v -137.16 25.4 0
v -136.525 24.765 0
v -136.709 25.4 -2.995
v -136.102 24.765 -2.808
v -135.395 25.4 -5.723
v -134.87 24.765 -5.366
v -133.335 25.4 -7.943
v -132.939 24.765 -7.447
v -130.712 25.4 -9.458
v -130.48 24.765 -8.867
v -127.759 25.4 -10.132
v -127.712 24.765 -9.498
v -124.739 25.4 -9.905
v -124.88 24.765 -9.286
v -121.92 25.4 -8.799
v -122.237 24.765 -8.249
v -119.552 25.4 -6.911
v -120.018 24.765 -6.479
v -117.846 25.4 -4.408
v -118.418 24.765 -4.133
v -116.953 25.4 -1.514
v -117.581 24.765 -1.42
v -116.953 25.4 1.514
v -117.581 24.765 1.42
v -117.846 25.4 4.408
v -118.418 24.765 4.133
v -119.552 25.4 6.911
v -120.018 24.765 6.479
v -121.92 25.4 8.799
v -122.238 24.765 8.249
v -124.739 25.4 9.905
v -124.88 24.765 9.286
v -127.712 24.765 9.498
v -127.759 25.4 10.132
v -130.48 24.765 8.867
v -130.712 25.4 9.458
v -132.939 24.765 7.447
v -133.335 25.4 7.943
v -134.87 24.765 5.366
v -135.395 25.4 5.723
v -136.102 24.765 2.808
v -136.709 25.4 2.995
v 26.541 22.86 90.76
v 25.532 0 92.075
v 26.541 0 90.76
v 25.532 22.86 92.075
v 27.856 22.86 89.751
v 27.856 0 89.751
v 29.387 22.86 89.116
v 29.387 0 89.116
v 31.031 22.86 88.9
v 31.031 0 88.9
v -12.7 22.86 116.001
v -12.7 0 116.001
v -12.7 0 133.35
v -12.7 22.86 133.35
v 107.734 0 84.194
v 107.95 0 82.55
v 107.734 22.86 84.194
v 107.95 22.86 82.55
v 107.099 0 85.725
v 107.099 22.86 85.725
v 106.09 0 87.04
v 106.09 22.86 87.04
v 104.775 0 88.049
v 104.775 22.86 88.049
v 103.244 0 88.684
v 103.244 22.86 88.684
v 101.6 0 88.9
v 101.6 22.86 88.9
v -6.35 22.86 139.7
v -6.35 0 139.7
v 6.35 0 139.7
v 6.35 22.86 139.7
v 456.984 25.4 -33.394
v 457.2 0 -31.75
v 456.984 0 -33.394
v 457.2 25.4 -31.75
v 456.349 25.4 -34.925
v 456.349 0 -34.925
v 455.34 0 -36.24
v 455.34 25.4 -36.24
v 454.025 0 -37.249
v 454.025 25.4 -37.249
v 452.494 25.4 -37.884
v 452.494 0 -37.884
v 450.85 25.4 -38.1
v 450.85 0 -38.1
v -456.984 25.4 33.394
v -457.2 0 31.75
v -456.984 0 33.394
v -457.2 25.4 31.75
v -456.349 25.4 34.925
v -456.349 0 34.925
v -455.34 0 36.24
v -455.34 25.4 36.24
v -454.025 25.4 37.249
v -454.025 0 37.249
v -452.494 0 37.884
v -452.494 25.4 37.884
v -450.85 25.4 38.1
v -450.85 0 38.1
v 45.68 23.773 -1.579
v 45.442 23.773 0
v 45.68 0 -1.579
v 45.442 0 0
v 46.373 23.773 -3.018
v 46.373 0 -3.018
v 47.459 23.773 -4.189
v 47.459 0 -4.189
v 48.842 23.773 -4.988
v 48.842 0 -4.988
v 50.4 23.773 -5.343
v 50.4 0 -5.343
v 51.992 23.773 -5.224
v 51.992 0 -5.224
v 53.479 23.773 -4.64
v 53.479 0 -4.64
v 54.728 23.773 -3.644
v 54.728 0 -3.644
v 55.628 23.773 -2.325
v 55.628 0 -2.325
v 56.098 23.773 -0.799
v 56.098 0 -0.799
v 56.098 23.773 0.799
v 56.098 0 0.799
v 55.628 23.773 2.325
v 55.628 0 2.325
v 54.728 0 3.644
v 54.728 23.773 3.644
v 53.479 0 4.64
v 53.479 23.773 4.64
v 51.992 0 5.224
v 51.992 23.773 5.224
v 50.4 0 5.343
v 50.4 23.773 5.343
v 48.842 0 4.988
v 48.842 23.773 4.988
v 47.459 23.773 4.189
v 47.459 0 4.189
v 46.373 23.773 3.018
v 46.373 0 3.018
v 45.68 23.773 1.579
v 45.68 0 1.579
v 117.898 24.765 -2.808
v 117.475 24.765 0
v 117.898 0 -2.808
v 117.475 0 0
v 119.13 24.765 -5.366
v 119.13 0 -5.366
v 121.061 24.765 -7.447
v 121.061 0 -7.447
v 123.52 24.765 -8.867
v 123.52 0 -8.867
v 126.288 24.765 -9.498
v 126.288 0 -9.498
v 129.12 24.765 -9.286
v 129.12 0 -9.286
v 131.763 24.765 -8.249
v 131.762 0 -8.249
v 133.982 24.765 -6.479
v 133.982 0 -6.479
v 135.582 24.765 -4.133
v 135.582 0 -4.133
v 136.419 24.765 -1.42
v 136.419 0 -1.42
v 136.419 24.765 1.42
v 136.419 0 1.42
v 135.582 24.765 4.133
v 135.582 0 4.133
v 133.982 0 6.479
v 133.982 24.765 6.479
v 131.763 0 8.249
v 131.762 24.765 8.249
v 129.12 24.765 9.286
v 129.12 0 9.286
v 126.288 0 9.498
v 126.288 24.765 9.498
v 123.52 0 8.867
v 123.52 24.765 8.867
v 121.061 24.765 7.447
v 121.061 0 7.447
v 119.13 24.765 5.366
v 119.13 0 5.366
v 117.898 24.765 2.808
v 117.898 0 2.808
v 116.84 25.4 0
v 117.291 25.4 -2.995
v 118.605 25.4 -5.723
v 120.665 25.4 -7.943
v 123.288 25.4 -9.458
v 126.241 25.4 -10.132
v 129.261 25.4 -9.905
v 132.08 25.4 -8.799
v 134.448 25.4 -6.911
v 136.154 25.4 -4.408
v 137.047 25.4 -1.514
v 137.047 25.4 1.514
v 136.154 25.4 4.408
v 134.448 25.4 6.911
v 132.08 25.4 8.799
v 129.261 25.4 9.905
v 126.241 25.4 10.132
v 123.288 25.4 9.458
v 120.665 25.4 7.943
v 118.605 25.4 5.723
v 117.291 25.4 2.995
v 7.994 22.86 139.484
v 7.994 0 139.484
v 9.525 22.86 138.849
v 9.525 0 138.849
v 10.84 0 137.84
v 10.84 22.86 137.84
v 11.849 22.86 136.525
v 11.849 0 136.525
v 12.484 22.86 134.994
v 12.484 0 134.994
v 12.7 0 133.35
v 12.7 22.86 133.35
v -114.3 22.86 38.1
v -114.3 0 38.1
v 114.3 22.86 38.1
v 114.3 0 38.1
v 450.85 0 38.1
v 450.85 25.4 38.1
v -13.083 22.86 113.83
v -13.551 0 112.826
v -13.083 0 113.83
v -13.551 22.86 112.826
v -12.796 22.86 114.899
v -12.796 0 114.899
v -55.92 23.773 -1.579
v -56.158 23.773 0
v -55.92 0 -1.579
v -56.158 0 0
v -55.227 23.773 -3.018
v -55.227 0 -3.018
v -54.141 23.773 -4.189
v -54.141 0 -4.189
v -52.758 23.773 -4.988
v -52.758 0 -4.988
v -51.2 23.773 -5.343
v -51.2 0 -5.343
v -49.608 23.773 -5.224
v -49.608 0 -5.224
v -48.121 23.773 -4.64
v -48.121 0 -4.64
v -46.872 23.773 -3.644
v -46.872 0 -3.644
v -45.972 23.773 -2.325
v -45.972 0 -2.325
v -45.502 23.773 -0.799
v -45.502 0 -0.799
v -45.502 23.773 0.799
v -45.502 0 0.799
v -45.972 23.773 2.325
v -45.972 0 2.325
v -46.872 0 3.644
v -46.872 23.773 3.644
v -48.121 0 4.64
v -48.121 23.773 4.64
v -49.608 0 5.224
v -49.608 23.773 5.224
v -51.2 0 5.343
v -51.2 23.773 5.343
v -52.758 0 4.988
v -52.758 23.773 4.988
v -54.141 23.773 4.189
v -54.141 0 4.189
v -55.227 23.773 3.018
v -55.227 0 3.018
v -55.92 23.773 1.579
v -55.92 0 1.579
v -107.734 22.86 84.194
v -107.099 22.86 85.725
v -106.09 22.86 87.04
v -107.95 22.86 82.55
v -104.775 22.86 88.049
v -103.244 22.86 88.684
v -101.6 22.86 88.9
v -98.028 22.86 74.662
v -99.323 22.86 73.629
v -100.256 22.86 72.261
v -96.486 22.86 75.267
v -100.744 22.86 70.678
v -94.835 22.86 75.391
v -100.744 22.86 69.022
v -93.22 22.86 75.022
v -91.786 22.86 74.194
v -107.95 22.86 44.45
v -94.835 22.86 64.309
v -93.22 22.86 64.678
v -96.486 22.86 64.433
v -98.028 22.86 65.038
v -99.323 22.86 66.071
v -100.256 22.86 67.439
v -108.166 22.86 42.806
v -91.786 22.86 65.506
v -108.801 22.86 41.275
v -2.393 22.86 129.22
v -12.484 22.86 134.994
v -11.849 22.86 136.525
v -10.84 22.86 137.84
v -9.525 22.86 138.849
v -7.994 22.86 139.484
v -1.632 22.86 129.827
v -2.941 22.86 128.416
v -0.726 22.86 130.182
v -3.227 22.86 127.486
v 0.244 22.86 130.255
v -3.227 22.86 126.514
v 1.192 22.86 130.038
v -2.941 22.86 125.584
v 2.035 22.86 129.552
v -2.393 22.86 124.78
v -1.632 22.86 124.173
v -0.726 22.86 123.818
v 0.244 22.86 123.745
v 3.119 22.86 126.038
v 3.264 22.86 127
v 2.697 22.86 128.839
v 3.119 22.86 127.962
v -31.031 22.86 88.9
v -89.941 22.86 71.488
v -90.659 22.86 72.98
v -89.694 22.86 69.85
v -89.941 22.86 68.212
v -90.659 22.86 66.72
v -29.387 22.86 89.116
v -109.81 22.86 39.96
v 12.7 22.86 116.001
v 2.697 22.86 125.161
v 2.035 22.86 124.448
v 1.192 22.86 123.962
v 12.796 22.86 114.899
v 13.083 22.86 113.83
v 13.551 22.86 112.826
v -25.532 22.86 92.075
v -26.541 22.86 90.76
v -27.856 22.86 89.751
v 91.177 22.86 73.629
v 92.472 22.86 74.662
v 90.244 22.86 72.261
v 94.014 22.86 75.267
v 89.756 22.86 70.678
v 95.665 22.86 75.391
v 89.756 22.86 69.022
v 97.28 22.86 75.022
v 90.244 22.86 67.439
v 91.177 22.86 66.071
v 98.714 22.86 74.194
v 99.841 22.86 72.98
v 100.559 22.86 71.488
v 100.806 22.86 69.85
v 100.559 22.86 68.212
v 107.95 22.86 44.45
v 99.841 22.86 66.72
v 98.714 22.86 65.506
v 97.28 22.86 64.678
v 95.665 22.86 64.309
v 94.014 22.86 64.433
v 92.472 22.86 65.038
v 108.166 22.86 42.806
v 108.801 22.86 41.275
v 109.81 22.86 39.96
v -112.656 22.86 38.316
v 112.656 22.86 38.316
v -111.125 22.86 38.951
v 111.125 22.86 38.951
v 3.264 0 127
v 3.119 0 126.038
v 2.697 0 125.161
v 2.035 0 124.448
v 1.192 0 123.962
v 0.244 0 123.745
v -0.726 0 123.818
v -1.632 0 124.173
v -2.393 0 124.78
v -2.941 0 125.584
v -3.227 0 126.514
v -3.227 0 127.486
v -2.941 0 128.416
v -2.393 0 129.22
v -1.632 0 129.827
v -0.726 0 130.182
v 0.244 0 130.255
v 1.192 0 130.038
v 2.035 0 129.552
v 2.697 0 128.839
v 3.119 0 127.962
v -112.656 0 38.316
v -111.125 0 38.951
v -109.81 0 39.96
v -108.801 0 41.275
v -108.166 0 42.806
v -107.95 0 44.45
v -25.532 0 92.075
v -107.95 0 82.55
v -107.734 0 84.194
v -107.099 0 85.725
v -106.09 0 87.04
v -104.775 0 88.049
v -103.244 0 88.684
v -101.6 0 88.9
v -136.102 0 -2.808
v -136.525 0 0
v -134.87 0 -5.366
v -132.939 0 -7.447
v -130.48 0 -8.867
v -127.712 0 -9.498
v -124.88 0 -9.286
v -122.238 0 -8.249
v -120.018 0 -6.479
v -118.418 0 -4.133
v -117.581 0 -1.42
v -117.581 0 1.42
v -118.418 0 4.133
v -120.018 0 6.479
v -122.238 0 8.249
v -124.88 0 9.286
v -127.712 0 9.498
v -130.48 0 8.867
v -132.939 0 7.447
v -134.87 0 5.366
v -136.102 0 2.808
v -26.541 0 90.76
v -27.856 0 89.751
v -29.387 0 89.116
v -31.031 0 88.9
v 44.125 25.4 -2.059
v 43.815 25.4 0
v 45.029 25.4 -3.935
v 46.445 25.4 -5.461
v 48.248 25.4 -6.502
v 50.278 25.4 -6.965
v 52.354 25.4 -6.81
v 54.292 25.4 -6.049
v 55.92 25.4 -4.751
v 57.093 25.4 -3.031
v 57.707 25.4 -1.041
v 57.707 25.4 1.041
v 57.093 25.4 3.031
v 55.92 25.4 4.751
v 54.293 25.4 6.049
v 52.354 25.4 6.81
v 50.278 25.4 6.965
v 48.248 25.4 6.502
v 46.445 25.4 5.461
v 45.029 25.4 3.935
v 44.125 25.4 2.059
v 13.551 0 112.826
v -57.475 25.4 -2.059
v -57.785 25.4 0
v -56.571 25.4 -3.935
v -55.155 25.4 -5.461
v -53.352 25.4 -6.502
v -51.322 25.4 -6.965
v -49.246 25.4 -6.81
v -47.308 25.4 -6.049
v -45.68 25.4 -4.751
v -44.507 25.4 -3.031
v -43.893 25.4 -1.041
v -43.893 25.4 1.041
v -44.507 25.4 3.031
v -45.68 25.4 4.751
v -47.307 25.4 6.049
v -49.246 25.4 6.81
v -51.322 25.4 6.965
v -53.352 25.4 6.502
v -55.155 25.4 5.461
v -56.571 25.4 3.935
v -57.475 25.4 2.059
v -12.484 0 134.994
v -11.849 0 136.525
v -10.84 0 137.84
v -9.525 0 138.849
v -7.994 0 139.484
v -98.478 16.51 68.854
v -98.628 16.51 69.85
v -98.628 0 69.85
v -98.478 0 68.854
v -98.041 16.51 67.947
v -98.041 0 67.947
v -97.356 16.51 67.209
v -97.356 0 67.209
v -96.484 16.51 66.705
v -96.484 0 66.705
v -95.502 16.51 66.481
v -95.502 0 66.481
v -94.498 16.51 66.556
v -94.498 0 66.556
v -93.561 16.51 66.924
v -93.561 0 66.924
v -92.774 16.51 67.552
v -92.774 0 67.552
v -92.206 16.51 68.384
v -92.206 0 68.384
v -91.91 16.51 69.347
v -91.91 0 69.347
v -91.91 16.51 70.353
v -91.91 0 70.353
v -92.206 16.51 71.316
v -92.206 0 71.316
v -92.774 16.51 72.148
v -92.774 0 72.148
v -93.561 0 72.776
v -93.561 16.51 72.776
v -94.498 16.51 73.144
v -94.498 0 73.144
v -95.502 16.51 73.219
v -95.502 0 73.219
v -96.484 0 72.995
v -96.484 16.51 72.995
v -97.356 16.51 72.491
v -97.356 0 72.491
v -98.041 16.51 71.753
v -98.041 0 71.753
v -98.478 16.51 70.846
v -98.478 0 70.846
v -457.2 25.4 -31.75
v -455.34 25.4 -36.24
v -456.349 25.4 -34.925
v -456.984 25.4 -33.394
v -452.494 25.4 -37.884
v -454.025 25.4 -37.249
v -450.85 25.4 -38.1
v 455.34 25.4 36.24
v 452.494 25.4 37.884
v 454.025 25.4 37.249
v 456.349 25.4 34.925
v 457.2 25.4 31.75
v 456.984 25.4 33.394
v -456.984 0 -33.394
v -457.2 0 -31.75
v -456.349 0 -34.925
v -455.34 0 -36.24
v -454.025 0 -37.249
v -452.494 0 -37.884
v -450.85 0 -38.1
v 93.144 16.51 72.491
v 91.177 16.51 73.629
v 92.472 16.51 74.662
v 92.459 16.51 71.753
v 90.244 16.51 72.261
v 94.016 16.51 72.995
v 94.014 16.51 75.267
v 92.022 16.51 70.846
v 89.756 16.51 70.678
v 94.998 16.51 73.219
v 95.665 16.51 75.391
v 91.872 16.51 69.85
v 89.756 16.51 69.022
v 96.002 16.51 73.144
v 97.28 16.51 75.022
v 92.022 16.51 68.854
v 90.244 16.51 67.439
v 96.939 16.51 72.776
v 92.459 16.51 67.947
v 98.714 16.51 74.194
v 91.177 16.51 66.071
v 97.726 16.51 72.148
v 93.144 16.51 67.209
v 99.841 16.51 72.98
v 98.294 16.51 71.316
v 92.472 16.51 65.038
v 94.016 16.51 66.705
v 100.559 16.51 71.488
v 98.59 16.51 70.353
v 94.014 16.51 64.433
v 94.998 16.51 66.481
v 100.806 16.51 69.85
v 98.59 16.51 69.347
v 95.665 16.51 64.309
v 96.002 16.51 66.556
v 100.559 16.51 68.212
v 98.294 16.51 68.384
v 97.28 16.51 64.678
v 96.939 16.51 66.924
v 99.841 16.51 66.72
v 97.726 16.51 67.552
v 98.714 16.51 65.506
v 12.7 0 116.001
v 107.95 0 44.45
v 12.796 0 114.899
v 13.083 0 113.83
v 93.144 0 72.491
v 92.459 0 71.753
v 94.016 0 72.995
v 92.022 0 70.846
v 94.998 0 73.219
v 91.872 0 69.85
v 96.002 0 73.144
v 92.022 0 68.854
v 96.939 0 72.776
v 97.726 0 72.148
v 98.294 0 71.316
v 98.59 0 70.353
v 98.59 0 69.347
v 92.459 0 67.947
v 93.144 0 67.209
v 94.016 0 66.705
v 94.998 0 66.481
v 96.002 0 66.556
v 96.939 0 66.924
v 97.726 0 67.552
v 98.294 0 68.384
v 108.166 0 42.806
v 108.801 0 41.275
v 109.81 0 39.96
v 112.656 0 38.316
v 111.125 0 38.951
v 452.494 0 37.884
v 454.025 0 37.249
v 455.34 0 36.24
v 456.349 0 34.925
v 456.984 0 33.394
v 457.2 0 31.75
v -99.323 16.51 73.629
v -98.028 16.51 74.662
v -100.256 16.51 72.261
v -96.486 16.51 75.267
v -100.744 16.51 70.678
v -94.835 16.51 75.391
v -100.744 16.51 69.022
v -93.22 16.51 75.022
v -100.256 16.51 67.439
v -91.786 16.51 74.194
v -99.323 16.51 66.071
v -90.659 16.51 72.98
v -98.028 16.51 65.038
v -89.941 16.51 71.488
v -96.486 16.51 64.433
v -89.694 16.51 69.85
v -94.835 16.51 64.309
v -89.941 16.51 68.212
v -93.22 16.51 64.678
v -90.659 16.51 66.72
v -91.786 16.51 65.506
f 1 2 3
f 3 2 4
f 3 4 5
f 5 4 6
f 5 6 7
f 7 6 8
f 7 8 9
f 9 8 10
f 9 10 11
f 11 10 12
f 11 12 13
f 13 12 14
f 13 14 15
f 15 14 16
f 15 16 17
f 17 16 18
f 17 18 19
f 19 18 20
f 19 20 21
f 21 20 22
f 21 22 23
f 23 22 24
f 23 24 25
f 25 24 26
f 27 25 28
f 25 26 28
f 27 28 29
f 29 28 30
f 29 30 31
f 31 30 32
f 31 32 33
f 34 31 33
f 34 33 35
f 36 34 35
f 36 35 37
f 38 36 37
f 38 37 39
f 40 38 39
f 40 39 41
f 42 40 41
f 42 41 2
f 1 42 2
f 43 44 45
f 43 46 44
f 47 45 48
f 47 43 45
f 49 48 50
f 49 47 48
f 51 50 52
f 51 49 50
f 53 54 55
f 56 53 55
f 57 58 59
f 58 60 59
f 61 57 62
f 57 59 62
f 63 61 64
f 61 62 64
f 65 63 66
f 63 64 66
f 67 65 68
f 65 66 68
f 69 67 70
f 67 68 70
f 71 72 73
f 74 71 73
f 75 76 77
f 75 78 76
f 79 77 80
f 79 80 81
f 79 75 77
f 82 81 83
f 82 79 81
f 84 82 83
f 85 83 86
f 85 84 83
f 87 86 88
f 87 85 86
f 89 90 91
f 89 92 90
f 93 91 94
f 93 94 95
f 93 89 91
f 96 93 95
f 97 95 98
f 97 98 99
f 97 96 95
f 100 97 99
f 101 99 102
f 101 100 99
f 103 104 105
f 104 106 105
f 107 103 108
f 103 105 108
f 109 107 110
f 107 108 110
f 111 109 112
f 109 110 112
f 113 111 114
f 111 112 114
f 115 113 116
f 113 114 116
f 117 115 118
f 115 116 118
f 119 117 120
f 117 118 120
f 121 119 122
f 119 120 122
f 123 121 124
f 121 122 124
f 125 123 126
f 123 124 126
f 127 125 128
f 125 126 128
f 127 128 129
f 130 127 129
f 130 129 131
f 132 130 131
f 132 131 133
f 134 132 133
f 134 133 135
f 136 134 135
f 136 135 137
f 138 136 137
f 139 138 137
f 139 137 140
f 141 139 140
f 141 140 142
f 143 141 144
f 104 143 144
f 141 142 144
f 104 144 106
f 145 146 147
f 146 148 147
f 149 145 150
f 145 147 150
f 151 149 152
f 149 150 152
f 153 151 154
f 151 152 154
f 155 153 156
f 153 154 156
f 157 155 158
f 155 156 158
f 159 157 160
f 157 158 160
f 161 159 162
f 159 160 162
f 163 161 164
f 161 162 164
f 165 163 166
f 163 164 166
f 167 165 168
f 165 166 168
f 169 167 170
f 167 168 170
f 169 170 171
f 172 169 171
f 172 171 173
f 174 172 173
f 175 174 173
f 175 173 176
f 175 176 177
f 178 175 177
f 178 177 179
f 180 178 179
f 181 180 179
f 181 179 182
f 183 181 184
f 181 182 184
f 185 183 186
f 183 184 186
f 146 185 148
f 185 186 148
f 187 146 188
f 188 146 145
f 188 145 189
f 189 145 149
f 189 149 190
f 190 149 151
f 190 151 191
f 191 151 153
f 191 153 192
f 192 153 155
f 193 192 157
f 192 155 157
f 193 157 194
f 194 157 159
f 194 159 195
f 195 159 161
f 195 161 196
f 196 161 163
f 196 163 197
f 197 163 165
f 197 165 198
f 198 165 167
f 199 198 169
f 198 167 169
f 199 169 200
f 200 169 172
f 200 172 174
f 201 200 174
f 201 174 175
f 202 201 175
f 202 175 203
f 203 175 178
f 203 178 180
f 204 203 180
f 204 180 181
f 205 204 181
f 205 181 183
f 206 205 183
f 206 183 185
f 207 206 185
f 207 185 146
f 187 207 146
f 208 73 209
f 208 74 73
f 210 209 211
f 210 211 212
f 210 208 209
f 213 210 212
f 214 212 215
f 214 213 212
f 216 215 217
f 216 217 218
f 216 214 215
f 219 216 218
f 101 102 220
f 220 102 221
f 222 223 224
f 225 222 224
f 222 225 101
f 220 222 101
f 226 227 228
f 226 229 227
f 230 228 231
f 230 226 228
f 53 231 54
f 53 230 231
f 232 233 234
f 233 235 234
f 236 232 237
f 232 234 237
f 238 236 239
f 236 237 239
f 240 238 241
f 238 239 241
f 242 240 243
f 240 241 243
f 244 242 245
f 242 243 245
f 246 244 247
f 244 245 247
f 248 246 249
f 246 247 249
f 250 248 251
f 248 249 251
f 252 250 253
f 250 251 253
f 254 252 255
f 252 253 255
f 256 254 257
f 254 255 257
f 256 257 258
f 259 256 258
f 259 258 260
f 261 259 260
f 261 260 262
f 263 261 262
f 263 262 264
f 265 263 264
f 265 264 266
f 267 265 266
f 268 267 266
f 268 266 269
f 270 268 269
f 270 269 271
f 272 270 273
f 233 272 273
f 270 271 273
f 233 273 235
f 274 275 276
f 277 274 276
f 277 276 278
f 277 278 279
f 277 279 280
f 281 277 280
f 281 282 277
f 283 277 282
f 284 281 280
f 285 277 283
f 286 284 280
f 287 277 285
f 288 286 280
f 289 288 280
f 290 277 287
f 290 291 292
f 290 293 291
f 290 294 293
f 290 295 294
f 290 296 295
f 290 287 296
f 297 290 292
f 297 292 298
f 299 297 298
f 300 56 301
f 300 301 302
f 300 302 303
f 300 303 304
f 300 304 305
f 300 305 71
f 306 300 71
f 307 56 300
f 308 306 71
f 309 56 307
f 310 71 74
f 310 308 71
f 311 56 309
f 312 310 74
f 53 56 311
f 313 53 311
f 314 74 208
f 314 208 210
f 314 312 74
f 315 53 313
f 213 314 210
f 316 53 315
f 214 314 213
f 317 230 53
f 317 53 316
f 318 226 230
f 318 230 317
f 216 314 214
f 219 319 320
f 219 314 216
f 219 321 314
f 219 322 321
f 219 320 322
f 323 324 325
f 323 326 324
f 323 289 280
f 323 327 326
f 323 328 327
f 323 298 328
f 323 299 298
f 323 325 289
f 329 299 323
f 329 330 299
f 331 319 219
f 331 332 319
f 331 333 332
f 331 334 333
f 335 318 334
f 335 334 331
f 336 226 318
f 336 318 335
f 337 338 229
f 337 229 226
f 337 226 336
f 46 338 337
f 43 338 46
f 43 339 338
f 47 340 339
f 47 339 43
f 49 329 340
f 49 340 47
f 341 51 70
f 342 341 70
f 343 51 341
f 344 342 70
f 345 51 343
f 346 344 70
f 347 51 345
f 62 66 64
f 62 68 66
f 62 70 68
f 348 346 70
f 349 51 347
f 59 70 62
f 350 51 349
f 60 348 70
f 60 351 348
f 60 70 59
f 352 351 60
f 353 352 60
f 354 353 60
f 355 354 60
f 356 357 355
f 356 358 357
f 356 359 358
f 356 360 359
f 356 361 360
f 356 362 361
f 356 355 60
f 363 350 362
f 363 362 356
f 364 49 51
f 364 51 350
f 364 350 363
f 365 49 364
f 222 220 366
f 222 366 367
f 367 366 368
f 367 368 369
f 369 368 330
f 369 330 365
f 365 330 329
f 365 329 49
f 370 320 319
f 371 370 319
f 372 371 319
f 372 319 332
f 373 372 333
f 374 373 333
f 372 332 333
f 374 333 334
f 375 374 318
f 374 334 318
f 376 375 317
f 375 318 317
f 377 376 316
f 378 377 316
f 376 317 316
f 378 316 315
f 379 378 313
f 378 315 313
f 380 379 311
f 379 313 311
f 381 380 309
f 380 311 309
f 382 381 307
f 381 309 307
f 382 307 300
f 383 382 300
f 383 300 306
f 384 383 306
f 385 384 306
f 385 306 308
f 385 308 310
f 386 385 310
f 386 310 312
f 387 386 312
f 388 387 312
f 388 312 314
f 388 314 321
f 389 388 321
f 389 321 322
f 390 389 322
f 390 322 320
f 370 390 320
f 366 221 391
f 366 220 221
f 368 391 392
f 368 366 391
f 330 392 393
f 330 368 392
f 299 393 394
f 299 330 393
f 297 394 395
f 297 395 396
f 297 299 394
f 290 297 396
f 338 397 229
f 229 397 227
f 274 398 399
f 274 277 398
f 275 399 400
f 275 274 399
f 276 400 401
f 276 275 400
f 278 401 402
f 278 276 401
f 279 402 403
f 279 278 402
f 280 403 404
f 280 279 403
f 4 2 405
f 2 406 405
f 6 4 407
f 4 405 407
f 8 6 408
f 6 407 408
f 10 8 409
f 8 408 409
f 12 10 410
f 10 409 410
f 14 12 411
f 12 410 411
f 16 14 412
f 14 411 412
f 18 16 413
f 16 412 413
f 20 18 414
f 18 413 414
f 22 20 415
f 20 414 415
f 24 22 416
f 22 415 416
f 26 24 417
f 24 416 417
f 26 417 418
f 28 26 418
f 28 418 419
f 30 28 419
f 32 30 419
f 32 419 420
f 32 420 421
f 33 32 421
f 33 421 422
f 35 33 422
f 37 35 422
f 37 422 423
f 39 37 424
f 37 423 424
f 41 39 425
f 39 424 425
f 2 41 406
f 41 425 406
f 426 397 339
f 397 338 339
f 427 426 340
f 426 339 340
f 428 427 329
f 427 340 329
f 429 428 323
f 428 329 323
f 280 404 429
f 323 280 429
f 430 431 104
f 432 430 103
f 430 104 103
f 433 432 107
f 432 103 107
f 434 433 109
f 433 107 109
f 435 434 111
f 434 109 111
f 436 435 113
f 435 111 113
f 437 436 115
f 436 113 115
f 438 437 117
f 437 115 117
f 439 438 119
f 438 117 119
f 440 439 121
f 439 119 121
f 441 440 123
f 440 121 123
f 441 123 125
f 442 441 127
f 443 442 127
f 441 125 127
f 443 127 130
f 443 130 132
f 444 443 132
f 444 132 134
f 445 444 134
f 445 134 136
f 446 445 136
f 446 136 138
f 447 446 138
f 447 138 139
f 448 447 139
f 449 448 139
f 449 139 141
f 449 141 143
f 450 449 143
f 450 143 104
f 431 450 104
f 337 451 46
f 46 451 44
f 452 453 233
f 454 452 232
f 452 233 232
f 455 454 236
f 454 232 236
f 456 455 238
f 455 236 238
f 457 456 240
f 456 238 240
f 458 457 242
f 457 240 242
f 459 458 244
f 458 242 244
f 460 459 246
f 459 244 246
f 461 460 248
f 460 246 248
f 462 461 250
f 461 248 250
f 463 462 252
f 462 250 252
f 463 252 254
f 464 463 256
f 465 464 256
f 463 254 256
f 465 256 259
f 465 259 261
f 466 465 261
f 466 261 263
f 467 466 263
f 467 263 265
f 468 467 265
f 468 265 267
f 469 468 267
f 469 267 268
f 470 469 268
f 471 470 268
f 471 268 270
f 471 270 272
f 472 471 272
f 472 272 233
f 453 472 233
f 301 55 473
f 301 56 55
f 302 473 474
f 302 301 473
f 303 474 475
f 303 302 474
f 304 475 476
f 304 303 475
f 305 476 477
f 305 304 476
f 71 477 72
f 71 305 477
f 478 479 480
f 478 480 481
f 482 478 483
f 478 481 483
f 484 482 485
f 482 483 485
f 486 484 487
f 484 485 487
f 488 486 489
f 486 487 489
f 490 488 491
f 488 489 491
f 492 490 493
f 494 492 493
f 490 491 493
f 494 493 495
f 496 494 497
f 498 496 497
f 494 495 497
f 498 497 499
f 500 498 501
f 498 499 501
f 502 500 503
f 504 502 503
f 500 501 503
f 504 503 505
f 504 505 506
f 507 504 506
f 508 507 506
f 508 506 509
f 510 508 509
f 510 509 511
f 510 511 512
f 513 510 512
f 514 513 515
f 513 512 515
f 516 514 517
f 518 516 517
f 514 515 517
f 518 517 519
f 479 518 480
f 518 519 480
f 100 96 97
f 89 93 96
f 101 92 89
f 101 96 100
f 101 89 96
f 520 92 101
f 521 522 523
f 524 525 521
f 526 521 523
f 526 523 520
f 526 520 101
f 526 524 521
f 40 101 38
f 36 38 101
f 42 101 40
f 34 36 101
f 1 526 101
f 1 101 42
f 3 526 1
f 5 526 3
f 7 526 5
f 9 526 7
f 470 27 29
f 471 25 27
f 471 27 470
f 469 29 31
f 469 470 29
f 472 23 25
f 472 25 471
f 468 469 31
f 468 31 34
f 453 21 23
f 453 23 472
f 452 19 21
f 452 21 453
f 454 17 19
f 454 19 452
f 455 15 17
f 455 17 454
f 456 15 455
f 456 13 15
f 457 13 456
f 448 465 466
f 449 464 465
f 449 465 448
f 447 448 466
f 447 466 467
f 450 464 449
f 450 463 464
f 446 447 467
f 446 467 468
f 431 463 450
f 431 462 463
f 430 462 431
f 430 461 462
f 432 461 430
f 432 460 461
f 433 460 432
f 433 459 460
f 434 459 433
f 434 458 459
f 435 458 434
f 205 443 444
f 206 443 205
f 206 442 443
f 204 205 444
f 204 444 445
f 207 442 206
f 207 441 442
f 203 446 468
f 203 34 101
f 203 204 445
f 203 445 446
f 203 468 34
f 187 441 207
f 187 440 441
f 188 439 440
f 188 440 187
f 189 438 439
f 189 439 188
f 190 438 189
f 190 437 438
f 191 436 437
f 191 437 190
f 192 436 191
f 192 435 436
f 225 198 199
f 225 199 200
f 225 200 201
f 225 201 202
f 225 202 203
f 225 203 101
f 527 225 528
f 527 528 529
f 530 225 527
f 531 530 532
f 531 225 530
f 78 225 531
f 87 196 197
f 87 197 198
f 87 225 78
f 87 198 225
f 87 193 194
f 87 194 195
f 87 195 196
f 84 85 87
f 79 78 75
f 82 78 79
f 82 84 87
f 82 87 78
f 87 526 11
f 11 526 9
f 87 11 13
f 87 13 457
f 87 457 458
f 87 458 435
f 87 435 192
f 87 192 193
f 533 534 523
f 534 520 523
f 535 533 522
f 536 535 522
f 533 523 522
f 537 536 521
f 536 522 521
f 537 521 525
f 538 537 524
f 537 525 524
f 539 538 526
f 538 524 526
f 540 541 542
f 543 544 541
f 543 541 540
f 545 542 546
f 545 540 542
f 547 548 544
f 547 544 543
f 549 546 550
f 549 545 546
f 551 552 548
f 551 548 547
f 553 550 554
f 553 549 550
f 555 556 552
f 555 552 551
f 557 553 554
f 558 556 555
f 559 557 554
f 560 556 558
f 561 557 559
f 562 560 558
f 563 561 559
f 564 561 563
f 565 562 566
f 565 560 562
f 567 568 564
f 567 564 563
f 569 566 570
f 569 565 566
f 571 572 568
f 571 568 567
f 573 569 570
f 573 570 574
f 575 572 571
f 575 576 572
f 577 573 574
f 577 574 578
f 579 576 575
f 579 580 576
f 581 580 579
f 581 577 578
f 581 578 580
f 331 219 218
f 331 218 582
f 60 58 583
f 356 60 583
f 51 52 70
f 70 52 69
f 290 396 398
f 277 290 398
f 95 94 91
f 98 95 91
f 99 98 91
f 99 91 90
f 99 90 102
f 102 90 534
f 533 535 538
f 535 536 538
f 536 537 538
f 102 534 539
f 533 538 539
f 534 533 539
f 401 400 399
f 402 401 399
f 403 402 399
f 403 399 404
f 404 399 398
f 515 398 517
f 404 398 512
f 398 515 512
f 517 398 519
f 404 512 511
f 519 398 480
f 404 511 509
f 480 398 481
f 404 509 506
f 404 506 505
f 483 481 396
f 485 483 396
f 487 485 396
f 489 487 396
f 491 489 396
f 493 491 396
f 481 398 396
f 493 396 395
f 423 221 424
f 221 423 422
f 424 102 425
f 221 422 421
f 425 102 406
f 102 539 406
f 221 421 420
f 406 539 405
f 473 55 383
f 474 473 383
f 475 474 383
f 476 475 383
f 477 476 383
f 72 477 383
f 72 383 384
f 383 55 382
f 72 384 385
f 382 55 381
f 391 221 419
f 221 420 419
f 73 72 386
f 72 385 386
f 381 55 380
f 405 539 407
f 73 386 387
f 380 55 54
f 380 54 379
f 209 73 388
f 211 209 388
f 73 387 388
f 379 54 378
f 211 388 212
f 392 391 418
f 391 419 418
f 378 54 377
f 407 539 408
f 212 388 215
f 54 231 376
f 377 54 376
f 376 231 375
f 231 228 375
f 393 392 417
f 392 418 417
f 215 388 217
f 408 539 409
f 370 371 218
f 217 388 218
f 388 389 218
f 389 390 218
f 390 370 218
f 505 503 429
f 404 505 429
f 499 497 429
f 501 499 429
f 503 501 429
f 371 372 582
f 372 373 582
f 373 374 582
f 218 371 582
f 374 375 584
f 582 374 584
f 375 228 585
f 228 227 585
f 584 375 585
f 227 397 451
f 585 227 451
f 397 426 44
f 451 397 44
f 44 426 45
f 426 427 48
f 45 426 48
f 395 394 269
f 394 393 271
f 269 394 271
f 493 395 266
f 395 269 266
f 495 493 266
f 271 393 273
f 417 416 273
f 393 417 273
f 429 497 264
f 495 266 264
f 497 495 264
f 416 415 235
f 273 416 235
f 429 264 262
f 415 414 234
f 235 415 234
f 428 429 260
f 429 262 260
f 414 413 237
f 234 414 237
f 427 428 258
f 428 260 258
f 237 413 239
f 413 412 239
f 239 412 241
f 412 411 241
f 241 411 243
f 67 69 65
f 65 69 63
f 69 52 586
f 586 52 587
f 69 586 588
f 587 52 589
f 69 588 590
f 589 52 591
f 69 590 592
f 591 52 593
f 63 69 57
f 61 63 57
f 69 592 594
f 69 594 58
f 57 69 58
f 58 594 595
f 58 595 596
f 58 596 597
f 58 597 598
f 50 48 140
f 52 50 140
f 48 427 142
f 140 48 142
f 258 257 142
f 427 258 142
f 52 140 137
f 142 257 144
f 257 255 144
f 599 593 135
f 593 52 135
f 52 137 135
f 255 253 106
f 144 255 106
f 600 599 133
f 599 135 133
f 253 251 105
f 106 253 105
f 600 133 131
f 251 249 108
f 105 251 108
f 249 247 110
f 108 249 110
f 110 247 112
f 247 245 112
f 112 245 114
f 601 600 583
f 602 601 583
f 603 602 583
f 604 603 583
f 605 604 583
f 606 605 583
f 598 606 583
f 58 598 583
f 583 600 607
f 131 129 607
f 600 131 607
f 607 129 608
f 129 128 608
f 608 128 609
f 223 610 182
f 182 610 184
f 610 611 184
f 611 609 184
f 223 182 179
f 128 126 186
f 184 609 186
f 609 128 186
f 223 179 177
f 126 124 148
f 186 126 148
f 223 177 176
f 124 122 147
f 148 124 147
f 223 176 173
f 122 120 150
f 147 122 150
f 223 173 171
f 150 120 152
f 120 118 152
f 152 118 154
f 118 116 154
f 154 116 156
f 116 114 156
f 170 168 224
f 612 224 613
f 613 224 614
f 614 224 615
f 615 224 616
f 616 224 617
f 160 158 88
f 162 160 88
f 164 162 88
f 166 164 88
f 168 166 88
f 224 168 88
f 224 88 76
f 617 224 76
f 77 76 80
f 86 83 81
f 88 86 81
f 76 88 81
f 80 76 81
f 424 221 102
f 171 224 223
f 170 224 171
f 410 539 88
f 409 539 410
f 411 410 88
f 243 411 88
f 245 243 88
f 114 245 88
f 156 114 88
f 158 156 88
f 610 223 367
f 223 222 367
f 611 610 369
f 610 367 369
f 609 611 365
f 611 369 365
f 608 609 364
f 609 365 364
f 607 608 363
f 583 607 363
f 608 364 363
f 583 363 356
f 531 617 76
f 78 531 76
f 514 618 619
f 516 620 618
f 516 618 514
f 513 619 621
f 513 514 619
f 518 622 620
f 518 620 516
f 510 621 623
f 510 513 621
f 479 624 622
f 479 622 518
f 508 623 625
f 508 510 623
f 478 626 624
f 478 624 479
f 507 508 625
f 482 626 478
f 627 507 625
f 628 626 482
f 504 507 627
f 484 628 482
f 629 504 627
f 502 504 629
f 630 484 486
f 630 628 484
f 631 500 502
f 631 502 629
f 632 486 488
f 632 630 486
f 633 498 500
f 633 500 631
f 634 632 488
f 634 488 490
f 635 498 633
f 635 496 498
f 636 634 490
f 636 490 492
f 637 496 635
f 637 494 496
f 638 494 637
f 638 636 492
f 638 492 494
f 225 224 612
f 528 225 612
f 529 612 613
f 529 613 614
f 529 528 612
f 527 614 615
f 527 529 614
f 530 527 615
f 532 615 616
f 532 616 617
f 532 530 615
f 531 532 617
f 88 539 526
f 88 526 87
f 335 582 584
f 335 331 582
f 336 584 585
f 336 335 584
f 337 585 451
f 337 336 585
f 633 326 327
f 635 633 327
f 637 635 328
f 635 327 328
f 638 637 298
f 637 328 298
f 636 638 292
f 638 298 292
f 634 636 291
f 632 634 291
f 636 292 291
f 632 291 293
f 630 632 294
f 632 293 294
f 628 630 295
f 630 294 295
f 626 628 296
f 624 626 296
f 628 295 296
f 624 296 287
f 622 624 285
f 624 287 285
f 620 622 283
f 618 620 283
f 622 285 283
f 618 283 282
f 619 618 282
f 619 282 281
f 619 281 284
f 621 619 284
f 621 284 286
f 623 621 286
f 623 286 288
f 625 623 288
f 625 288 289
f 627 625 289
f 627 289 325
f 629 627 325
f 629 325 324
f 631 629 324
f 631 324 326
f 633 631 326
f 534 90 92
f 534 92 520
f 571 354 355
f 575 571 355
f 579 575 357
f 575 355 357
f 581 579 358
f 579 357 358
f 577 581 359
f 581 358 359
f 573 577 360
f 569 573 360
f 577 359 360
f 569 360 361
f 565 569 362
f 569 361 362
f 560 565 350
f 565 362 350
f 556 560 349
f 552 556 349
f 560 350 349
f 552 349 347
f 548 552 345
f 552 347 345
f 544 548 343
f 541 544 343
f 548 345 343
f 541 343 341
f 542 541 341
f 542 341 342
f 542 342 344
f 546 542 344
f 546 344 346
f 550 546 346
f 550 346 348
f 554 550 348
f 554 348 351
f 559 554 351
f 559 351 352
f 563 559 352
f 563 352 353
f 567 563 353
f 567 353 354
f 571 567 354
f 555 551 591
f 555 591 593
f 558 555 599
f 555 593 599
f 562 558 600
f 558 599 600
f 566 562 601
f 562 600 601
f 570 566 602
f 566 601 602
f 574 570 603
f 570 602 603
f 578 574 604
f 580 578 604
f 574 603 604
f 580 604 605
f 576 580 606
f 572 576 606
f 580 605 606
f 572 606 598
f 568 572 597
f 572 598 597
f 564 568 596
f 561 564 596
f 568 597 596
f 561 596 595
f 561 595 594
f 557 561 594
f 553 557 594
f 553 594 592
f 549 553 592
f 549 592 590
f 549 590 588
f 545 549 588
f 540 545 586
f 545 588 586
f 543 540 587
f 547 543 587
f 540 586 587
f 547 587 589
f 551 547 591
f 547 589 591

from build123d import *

# Parameters (mm, degrees)
SKETCH1_W                                        = 914.4
SKETCH1_H                                        = 76.2
BOSS_EXTRUDE1_DEPTH                              = 25.4
FILLET1_R                                        = 6.35
F_3_4_0_7500_DOWEL_HOLE1_D                       = 19.05
F_3_4_0_7500_DOWEL_HOLE1_CSINK_D                 = 20.32
F_3_4_0_7500_DOWEL_HOLE1_CSINK_ANGLE             = 90
BOSS_EXTRUDE2_DEPTH                              = 22.86
FILLET2_R                                        = 6.35
F_5_16_18_TAPPED_HOLE1_D                         = 6.5278
F_1_2_13_TAPPED_HOLE1_D                          = 10.71626
F_1_2_13_TAPPED_HOLE1_CSINK_D                    = 13.97
F_1_2_13_TAPPED_HOLE1_CSINK_ANGLE                = 90
CBORE_FOR_1_4_SOCKET_HEAD_CAP_SCREW1_D           = 6.7564
CBORE_FOR_1_4_SOCKET_HEAD_CAP_SCREW1_CBORE_D     = 11.1125
CBORE_FOR_1_4_SOCKET_HEAD_CAP_SCREW1_CBORE_DEPTH = 6.35


with BuildPart() as part:
    # Sketch1 → Boss-Extrude1 (new body)
    with BuildSketch(Plane(origin=(0, 0, 0), x_dir=(1, 0, 0), z_dir=(0, 1, 0))):
        Rectangle(SKETCH1_W, SKETCH1_H)
    extrude(amount=BOSS_EXTRUDE1_DEPTH)

    # Fillet1
    fillet1_edges = [part.edges().sort_by_distance(p)[0] for p in [
        (457.2, 12.7, 38.1),
        (-457.2, 12.7, 38.1),
        (-457.2, 12.7, -38.1),
        (457.2, 12.7, -38.1),
    ]]
    fillet(fillet1_edges, radius=FILLET1_R)

    # 3/4 (0.7500) Dowel Hole1 (through all)
    with Locations(Plane(origin=(0, 25.4, 0), x_dir=(1, 0, 0), z_dir=(0, 1, 0))):
        with Locations((-127, 0), (127, 0)):
            CounterSinkHole(F_3_4_0_7500_DOWEL_HOLE1_D / 2, F_3_4_0_7500_DOWEL_HOLE1_CSINK_D / 2, counter_sink_angle=F_3_4_0_7500_DOWEL_HOLE1_CSINK_ANGLE)

    # Sketch7 → Boss-Extrude2 (add)
    with BuildSketch(Plane(origin=(0, 0, 0), x_dir=(1, 0, 0), z_dir=(0, 1, 0))):
        Polygon((-27.364696837, -88.9), (-12.7, -114.3), (-12.7, -139.7), (12.7, -139.7), (12.7, -114.3), (27.364696837, -88.9), (107.95, -88.9), (107.95, -38.1), (-107.95, -38.1), (-107.95, -88.9), align=None)
    extrude(amount=BOSS_EXTRUDE2_DEPTH)

    # Fillet2
    fillet2_edges = [part.edges().sort_by_distance(p)[0] for p in [
        (107.95, 11.43, 88.9),
        (107.95, 11.43, 38.1),
        (-107.95, 11.43, 38.1),
        (-107.95, 11.43, 88.9),
        (-27.364696837, 11.43, 88.9),
        (-12.7, 11.43, 114.3),
        (-12.7, 11.43, 139.7),
        (12.7, 11.43, 139.7),
        (12.7, 11.43, 114.3),
        (27.364696837, 11.43, 88.9),
    ]]
    fillet(fillet2_edges, radius=FILLET2_R)

    # 5/16-18 Tapped Hole1 (through all)
    with Locations(Plane(origin=(0, 0, 0), x_dir=(-1, 0, 0), z_dir=(0, -1, 0))):
        with Locations((0, -127)):
            Hole(F_5_16_18_TAPPED_HOLE1_D / 2)

    # 1/2-13 Tapped Hole1 (through all)
    with Locations(Plane(origin=(0, 25.4, 0), x_dir=(1, 0, 0), z_dir=(0, 1, 0))):
        with Locations((-50.8, 0), (50.8, 0)):
            CounterSinkHole(F_1_2_13_TAPPED_HOLE1_D / 2, F_1_2_13_TAPPED_HOLE1_CSINK_D / 2, counter_sink_angle=F_1_2_13_TAPPED_HOLE1_CSINK_ANGLE)

    # CBORE for 1/4 Socket Head Cap Screw1 (through all)
    with Locations(Plane(origin=(0, 22.86, 0), x_dir=(1, 0, 0), z_dir=(0, 1, 0))):
        with Locations((-95.25, -69.85), (95.25, -69.85)):
            CounterBoreHole(CBORE_FOR_1_4_SOCKET_HEAD_CAP_SCREW1_D / 2, CBORE_FOR_1_4_SOCKET_HEAD_CAP_SCREW1_CBORE_D / 2, CBORE_FOR_1_4_SOCKET_HEAD_CAP_SCREW1_CBORE_DEPTH)


solid = part.part
